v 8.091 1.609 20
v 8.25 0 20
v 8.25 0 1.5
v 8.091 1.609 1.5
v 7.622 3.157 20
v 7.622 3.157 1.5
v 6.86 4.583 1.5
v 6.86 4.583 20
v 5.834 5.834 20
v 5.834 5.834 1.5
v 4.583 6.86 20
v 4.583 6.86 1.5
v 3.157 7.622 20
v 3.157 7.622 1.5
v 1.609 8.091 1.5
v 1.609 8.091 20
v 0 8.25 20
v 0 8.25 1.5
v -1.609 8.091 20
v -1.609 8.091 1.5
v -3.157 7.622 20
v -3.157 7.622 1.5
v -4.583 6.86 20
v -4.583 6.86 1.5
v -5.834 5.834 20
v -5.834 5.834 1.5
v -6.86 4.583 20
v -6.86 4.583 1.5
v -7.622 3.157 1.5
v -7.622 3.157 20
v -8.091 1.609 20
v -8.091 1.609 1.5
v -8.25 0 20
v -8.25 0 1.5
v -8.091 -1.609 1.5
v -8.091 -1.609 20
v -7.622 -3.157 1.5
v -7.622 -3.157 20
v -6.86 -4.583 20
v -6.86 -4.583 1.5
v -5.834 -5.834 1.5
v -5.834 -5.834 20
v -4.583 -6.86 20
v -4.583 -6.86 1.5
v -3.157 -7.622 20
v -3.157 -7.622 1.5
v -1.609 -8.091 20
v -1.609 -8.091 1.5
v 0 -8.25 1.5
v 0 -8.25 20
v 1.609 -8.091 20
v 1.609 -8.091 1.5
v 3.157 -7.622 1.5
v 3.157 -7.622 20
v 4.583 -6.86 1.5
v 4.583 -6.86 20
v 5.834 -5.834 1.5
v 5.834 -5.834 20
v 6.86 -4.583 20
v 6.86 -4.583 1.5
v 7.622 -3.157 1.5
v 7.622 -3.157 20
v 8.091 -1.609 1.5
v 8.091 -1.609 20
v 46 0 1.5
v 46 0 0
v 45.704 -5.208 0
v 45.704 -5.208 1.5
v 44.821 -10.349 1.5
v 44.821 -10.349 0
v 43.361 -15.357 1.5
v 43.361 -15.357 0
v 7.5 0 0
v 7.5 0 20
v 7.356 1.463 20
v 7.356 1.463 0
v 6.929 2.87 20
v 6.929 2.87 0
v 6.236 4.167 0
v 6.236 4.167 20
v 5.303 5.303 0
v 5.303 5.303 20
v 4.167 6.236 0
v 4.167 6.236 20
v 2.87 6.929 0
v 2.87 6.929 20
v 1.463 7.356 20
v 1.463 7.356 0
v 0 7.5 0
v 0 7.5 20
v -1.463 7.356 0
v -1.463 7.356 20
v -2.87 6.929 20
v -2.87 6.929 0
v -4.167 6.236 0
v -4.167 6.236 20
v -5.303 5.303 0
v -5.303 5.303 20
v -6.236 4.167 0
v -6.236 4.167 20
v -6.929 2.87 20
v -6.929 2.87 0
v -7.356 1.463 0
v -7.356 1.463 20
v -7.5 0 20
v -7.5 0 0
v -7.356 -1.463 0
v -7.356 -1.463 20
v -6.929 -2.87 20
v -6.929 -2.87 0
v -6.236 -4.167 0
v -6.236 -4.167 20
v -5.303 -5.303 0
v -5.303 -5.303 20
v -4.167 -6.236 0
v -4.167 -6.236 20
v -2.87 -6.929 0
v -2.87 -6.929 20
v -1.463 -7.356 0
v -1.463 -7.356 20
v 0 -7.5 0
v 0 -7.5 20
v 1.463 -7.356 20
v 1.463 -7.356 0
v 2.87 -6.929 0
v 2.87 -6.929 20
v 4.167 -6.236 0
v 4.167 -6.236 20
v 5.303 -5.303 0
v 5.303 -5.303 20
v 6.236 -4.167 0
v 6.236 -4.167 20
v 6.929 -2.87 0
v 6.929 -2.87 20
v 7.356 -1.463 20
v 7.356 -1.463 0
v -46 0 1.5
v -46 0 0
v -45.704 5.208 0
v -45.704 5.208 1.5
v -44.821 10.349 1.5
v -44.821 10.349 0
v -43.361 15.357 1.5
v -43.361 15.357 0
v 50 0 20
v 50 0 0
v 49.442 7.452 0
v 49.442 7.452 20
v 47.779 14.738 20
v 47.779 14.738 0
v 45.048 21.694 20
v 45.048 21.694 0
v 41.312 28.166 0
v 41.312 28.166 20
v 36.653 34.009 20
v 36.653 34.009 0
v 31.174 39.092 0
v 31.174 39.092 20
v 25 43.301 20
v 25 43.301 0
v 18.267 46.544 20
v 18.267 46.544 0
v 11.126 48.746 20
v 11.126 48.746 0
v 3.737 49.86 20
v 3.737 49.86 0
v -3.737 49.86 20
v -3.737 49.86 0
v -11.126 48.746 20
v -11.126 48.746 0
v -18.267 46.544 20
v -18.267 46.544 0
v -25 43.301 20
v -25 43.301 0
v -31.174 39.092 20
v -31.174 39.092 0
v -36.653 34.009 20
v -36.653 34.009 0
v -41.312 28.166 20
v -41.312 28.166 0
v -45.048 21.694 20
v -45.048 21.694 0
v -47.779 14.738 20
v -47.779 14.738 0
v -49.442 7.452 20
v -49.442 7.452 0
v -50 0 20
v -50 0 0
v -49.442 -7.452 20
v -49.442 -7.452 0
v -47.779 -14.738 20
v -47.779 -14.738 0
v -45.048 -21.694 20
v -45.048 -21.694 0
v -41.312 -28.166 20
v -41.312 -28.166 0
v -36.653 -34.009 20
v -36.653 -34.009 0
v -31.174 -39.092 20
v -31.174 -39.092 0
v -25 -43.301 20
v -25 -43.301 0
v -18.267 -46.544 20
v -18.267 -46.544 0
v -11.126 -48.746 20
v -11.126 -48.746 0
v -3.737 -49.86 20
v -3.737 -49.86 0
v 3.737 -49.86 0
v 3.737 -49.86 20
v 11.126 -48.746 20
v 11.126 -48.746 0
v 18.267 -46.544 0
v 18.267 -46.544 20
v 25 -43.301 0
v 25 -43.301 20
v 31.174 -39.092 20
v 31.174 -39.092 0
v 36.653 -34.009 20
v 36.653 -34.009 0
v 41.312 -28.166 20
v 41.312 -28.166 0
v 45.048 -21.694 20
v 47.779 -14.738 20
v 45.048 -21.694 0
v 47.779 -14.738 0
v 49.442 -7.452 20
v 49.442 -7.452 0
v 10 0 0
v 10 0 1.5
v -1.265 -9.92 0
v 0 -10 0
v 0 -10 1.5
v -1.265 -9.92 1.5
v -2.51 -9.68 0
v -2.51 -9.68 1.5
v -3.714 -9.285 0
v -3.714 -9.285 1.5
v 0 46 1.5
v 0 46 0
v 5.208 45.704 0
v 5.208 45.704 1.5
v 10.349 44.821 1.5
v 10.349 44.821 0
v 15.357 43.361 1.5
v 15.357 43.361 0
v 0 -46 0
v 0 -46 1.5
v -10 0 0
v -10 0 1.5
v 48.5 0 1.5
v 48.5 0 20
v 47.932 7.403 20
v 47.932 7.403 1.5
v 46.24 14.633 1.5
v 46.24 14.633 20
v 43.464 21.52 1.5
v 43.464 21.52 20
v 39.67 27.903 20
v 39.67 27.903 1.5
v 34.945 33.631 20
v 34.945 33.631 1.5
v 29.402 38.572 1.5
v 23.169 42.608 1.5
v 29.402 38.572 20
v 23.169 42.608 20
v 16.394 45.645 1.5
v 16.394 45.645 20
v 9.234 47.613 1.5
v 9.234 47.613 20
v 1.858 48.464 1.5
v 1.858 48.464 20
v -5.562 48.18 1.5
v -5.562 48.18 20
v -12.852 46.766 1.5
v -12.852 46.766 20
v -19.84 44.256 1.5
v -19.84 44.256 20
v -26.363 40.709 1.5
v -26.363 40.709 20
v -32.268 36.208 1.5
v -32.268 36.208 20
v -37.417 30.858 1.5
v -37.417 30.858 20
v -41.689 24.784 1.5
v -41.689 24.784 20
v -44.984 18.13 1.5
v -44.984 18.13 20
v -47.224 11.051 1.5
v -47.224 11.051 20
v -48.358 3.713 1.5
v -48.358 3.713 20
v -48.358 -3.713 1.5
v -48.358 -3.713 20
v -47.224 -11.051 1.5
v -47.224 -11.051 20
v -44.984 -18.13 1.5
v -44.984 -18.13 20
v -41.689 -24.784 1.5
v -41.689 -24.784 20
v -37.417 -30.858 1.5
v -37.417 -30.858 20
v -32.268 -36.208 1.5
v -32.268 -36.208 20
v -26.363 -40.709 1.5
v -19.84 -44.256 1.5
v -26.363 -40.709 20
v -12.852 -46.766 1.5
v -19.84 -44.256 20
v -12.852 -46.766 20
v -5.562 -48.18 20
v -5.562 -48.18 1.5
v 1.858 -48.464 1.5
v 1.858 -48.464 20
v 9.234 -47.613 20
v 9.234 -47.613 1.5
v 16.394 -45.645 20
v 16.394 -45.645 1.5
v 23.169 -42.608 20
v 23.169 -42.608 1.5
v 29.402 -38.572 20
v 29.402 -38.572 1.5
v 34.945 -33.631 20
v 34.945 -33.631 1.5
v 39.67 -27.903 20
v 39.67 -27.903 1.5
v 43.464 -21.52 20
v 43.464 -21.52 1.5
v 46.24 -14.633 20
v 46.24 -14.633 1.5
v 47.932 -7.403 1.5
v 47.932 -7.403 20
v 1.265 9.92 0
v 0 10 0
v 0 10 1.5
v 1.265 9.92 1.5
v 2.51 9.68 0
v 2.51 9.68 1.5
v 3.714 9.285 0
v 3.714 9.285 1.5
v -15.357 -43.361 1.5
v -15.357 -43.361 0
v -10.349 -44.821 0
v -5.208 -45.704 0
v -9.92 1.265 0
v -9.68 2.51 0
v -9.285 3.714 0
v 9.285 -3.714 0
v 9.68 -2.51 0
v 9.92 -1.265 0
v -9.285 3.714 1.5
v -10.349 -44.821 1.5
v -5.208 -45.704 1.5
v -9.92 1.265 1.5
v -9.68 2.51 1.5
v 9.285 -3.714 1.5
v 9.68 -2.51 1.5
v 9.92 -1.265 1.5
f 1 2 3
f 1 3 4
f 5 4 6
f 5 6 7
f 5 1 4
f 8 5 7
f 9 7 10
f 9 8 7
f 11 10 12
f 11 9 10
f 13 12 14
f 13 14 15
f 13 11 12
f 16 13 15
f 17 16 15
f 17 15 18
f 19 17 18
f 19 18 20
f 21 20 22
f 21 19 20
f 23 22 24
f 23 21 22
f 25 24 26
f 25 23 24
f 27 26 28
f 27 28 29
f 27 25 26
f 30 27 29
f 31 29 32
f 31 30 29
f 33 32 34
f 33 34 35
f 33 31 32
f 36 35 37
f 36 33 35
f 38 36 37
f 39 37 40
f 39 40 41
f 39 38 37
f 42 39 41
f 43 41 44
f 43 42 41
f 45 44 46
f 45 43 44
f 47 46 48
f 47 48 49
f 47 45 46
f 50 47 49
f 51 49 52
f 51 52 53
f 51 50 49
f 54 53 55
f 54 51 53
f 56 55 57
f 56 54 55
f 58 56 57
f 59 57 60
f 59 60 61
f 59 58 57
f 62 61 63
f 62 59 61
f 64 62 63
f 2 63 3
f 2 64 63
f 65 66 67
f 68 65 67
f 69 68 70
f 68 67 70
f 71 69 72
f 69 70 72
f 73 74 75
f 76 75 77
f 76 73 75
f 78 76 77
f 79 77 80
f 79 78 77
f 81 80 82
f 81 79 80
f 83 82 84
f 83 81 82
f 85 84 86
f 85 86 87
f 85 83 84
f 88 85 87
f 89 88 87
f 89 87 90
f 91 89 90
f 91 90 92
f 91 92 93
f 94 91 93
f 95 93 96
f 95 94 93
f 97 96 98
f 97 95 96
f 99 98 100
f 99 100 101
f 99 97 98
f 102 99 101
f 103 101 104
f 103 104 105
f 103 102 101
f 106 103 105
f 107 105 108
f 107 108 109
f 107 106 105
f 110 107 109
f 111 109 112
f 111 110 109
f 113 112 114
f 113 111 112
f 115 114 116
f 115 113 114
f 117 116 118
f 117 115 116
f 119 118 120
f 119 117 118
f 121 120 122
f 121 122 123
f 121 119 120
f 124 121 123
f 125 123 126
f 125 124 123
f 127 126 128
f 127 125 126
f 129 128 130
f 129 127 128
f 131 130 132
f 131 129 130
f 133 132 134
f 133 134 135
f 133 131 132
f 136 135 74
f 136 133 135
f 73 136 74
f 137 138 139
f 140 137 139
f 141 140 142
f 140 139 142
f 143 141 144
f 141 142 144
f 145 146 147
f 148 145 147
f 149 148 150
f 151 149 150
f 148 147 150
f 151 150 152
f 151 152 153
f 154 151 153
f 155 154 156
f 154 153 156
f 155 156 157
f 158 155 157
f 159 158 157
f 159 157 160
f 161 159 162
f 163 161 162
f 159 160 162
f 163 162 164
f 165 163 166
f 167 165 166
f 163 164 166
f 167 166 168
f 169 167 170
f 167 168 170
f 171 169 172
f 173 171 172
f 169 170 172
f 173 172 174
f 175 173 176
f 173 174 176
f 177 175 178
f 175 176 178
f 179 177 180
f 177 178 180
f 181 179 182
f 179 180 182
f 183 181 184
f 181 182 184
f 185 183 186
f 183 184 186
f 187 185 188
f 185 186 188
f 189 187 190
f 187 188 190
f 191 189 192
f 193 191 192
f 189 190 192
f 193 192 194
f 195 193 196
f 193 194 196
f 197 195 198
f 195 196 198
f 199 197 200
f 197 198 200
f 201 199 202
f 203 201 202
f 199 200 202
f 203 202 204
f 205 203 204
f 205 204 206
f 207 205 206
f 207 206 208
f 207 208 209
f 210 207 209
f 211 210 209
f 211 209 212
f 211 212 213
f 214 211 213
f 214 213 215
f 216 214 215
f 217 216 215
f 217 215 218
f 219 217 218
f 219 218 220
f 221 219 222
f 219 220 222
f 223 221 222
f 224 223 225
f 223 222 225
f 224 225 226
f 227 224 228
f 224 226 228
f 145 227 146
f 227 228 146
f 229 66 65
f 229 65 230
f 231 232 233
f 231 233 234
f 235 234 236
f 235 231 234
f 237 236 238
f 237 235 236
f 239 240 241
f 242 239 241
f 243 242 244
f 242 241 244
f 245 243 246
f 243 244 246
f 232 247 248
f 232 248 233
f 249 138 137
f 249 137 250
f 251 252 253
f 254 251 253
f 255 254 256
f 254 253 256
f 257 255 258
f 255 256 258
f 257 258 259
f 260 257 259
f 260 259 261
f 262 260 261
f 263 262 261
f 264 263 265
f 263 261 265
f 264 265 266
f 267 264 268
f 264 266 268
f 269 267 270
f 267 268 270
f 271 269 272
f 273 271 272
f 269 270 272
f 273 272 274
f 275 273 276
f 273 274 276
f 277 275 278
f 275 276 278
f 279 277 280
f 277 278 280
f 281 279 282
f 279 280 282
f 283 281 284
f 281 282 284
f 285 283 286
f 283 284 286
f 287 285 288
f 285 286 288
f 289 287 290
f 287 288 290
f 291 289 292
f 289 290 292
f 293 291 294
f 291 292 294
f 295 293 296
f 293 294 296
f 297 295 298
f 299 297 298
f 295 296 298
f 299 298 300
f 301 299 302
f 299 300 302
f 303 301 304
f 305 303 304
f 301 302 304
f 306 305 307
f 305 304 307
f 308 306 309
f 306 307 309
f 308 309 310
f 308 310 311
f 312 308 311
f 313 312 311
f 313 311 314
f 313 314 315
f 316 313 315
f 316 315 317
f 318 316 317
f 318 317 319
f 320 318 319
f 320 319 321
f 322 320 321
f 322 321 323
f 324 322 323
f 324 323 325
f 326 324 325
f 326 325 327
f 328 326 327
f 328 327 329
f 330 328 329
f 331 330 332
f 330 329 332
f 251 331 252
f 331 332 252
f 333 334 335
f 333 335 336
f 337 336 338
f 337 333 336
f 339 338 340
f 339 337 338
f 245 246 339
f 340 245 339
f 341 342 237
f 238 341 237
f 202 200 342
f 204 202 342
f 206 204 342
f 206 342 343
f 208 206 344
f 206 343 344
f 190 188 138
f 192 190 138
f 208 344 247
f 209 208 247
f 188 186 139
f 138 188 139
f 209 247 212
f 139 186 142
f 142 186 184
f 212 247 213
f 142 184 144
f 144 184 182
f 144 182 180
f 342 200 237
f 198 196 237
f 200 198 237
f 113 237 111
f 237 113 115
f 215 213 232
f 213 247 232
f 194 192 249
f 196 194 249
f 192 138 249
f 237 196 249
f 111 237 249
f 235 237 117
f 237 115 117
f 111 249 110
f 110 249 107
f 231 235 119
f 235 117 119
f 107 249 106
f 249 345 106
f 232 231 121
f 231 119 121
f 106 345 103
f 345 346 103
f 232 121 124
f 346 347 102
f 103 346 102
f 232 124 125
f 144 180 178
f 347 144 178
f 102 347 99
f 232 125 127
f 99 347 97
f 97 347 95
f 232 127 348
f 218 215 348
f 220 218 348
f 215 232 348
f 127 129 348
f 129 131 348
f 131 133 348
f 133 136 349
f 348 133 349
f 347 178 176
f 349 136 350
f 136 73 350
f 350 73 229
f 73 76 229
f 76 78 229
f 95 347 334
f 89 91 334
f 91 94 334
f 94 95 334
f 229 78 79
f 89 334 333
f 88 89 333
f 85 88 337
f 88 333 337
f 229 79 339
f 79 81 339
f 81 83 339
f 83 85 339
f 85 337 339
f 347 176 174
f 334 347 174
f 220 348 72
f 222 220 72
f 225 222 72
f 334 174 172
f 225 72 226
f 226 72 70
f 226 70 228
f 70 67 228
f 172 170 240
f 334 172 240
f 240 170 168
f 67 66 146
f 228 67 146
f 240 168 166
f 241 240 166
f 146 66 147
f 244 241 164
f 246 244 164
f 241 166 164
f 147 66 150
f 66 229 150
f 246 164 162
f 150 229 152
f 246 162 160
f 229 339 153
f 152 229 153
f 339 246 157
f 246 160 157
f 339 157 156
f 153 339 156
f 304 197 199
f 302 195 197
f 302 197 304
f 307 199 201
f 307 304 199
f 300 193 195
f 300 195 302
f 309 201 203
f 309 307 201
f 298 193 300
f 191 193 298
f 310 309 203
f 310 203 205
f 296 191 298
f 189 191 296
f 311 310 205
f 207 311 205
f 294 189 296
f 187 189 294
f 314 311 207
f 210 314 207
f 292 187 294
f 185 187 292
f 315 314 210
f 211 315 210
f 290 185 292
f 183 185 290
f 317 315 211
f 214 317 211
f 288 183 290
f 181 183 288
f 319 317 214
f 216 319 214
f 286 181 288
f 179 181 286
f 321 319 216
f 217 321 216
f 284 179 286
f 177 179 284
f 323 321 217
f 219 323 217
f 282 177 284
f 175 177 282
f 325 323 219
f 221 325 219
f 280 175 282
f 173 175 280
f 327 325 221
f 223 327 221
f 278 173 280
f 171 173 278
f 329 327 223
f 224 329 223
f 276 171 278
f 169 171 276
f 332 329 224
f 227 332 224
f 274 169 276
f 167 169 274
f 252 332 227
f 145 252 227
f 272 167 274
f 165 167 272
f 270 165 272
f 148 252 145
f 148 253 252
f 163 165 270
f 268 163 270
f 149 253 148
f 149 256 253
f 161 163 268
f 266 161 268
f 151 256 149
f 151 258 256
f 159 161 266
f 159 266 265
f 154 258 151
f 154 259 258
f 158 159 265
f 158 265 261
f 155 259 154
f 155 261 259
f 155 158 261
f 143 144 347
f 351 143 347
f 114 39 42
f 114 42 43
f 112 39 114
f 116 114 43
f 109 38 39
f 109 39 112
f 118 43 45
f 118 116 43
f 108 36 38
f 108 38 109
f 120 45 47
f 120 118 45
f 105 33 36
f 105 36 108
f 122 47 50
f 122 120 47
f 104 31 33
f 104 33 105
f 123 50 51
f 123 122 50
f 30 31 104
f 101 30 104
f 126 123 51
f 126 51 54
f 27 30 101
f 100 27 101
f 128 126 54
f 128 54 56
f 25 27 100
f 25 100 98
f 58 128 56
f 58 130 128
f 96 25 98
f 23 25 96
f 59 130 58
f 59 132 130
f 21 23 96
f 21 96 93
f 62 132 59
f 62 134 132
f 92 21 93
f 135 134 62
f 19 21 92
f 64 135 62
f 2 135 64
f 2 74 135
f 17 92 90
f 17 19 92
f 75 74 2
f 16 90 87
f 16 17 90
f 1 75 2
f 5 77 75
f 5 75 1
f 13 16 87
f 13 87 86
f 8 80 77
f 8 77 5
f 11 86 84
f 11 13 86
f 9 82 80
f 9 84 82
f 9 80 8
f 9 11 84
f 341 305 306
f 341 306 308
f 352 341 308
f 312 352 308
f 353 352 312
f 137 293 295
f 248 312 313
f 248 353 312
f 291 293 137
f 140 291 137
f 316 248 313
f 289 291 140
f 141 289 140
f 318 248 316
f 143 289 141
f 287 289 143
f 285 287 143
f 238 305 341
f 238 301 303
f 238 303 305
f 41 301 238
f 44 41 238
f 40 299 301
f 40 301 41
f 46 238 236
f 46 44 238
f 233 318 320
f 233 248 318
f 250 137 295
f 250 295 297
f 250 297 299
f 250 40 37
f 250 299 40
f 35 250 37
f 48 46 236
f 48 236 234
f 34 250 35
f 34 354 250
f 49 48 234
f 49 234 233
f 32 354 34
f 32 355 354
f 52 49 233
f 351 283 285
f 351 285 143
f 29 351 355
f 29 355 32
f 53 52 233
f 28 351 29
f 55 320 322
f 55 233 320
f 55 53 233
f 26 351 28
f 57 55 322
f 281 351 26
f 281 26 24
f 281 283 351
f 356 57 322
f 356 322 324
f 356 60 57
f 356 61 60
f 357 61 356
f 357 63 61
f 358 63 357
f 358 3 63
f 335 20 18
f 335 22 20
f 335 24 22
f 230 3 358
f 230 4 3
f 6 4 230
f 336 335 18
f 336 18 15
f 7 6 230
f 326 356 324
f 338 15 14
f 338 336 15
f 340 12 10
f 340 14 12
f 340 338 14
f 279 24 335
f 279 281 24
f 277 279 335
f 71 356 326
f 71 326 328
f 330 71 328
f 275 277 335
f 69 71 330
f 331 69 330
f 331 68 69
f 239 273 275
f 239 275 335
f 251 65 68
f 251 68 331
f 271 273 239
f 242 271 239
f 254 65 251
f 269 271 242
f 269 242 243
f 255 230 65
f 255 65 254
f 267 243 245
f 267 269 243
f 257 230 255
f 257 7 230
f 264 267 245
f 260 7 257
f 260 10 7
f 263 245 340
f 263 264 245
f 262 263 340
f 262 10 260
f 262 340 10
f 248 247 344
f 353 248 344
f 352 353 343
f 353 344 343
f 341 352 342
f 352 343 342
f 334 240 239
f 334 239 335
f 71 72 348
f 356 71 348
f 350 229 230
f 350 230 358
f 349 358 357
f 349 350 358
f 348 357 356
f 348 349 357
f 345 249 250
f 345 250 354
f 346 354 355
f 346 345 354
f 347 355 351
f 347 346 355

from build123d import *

# Parameters (mm, degrees)
SKETCH_R           = 50
SKETCH_R_2         = 7.5
PAD_DEPTH          = 20
SKETCH001_R        = 48.5
SKETCH001_R_2      = 8.25
POCKET_DEPTH       = 18.5
POCKET001_DEPTH    = 5
POLARPATTERN_COUNT = 4


with BuildPart() as part:
    # Sketch → Pad (new body)
    with BuildSketch(Plane.XY):
        Circle(SKETCH_R)
        Circle(SKETCH_R_2, mode=Mode.SUBTRACT)
    extrude(amount=PAD_DEPTH)

    # Sketch001 (on Face4 of Pad) → Pocket (cut)
    with BuildSketch(Plane.XY.offset(20)):
        Circle(SKETCH001_R)
        Circle(SKETCH001_R_2, mode=Mode.SUBTRACT)
    extrude(amount=-POCKET_DEPTH, mode=Mode.SUBTRACT)

    # Sketch002 (on Face2 of Pocket) → Pocket001 (cut)
    with BuildSketch(Plane(origin=(0, 0, 0), x_dir=(1, 0, 0), z_dir=(0, 0, -1))):
        with BuildLine():
            ThreePointArc((0, 46), (-7.791201, 45.335386), (-15.357265, 43.360747))
            Line((-15.357265, 43.360747), (-3.713796, 9.284811))
            ThreePointArc((0, 10), (-1.891017, 9.819575), (-3.713796, 9.284811))
            Line((0, 46), (0, 10))
        make_face()
    pocket001 = extrude(amount=-POCKET001_DEPTH, mode=Mode.SUBTRACT)

    # PolarPattern: Pocket001 ×4 about axis
    polarpattern_axis = Axis((0, 0, 0), (0, 0, -1))
    for i in range(1, POLARPATTERN_COUNT):
        add(pocket001.rotate(polarpattern_axis, i * 360 / POLARPATTERN_COUNT), mode=Mode.SUBTRACT)


solid = part.part
